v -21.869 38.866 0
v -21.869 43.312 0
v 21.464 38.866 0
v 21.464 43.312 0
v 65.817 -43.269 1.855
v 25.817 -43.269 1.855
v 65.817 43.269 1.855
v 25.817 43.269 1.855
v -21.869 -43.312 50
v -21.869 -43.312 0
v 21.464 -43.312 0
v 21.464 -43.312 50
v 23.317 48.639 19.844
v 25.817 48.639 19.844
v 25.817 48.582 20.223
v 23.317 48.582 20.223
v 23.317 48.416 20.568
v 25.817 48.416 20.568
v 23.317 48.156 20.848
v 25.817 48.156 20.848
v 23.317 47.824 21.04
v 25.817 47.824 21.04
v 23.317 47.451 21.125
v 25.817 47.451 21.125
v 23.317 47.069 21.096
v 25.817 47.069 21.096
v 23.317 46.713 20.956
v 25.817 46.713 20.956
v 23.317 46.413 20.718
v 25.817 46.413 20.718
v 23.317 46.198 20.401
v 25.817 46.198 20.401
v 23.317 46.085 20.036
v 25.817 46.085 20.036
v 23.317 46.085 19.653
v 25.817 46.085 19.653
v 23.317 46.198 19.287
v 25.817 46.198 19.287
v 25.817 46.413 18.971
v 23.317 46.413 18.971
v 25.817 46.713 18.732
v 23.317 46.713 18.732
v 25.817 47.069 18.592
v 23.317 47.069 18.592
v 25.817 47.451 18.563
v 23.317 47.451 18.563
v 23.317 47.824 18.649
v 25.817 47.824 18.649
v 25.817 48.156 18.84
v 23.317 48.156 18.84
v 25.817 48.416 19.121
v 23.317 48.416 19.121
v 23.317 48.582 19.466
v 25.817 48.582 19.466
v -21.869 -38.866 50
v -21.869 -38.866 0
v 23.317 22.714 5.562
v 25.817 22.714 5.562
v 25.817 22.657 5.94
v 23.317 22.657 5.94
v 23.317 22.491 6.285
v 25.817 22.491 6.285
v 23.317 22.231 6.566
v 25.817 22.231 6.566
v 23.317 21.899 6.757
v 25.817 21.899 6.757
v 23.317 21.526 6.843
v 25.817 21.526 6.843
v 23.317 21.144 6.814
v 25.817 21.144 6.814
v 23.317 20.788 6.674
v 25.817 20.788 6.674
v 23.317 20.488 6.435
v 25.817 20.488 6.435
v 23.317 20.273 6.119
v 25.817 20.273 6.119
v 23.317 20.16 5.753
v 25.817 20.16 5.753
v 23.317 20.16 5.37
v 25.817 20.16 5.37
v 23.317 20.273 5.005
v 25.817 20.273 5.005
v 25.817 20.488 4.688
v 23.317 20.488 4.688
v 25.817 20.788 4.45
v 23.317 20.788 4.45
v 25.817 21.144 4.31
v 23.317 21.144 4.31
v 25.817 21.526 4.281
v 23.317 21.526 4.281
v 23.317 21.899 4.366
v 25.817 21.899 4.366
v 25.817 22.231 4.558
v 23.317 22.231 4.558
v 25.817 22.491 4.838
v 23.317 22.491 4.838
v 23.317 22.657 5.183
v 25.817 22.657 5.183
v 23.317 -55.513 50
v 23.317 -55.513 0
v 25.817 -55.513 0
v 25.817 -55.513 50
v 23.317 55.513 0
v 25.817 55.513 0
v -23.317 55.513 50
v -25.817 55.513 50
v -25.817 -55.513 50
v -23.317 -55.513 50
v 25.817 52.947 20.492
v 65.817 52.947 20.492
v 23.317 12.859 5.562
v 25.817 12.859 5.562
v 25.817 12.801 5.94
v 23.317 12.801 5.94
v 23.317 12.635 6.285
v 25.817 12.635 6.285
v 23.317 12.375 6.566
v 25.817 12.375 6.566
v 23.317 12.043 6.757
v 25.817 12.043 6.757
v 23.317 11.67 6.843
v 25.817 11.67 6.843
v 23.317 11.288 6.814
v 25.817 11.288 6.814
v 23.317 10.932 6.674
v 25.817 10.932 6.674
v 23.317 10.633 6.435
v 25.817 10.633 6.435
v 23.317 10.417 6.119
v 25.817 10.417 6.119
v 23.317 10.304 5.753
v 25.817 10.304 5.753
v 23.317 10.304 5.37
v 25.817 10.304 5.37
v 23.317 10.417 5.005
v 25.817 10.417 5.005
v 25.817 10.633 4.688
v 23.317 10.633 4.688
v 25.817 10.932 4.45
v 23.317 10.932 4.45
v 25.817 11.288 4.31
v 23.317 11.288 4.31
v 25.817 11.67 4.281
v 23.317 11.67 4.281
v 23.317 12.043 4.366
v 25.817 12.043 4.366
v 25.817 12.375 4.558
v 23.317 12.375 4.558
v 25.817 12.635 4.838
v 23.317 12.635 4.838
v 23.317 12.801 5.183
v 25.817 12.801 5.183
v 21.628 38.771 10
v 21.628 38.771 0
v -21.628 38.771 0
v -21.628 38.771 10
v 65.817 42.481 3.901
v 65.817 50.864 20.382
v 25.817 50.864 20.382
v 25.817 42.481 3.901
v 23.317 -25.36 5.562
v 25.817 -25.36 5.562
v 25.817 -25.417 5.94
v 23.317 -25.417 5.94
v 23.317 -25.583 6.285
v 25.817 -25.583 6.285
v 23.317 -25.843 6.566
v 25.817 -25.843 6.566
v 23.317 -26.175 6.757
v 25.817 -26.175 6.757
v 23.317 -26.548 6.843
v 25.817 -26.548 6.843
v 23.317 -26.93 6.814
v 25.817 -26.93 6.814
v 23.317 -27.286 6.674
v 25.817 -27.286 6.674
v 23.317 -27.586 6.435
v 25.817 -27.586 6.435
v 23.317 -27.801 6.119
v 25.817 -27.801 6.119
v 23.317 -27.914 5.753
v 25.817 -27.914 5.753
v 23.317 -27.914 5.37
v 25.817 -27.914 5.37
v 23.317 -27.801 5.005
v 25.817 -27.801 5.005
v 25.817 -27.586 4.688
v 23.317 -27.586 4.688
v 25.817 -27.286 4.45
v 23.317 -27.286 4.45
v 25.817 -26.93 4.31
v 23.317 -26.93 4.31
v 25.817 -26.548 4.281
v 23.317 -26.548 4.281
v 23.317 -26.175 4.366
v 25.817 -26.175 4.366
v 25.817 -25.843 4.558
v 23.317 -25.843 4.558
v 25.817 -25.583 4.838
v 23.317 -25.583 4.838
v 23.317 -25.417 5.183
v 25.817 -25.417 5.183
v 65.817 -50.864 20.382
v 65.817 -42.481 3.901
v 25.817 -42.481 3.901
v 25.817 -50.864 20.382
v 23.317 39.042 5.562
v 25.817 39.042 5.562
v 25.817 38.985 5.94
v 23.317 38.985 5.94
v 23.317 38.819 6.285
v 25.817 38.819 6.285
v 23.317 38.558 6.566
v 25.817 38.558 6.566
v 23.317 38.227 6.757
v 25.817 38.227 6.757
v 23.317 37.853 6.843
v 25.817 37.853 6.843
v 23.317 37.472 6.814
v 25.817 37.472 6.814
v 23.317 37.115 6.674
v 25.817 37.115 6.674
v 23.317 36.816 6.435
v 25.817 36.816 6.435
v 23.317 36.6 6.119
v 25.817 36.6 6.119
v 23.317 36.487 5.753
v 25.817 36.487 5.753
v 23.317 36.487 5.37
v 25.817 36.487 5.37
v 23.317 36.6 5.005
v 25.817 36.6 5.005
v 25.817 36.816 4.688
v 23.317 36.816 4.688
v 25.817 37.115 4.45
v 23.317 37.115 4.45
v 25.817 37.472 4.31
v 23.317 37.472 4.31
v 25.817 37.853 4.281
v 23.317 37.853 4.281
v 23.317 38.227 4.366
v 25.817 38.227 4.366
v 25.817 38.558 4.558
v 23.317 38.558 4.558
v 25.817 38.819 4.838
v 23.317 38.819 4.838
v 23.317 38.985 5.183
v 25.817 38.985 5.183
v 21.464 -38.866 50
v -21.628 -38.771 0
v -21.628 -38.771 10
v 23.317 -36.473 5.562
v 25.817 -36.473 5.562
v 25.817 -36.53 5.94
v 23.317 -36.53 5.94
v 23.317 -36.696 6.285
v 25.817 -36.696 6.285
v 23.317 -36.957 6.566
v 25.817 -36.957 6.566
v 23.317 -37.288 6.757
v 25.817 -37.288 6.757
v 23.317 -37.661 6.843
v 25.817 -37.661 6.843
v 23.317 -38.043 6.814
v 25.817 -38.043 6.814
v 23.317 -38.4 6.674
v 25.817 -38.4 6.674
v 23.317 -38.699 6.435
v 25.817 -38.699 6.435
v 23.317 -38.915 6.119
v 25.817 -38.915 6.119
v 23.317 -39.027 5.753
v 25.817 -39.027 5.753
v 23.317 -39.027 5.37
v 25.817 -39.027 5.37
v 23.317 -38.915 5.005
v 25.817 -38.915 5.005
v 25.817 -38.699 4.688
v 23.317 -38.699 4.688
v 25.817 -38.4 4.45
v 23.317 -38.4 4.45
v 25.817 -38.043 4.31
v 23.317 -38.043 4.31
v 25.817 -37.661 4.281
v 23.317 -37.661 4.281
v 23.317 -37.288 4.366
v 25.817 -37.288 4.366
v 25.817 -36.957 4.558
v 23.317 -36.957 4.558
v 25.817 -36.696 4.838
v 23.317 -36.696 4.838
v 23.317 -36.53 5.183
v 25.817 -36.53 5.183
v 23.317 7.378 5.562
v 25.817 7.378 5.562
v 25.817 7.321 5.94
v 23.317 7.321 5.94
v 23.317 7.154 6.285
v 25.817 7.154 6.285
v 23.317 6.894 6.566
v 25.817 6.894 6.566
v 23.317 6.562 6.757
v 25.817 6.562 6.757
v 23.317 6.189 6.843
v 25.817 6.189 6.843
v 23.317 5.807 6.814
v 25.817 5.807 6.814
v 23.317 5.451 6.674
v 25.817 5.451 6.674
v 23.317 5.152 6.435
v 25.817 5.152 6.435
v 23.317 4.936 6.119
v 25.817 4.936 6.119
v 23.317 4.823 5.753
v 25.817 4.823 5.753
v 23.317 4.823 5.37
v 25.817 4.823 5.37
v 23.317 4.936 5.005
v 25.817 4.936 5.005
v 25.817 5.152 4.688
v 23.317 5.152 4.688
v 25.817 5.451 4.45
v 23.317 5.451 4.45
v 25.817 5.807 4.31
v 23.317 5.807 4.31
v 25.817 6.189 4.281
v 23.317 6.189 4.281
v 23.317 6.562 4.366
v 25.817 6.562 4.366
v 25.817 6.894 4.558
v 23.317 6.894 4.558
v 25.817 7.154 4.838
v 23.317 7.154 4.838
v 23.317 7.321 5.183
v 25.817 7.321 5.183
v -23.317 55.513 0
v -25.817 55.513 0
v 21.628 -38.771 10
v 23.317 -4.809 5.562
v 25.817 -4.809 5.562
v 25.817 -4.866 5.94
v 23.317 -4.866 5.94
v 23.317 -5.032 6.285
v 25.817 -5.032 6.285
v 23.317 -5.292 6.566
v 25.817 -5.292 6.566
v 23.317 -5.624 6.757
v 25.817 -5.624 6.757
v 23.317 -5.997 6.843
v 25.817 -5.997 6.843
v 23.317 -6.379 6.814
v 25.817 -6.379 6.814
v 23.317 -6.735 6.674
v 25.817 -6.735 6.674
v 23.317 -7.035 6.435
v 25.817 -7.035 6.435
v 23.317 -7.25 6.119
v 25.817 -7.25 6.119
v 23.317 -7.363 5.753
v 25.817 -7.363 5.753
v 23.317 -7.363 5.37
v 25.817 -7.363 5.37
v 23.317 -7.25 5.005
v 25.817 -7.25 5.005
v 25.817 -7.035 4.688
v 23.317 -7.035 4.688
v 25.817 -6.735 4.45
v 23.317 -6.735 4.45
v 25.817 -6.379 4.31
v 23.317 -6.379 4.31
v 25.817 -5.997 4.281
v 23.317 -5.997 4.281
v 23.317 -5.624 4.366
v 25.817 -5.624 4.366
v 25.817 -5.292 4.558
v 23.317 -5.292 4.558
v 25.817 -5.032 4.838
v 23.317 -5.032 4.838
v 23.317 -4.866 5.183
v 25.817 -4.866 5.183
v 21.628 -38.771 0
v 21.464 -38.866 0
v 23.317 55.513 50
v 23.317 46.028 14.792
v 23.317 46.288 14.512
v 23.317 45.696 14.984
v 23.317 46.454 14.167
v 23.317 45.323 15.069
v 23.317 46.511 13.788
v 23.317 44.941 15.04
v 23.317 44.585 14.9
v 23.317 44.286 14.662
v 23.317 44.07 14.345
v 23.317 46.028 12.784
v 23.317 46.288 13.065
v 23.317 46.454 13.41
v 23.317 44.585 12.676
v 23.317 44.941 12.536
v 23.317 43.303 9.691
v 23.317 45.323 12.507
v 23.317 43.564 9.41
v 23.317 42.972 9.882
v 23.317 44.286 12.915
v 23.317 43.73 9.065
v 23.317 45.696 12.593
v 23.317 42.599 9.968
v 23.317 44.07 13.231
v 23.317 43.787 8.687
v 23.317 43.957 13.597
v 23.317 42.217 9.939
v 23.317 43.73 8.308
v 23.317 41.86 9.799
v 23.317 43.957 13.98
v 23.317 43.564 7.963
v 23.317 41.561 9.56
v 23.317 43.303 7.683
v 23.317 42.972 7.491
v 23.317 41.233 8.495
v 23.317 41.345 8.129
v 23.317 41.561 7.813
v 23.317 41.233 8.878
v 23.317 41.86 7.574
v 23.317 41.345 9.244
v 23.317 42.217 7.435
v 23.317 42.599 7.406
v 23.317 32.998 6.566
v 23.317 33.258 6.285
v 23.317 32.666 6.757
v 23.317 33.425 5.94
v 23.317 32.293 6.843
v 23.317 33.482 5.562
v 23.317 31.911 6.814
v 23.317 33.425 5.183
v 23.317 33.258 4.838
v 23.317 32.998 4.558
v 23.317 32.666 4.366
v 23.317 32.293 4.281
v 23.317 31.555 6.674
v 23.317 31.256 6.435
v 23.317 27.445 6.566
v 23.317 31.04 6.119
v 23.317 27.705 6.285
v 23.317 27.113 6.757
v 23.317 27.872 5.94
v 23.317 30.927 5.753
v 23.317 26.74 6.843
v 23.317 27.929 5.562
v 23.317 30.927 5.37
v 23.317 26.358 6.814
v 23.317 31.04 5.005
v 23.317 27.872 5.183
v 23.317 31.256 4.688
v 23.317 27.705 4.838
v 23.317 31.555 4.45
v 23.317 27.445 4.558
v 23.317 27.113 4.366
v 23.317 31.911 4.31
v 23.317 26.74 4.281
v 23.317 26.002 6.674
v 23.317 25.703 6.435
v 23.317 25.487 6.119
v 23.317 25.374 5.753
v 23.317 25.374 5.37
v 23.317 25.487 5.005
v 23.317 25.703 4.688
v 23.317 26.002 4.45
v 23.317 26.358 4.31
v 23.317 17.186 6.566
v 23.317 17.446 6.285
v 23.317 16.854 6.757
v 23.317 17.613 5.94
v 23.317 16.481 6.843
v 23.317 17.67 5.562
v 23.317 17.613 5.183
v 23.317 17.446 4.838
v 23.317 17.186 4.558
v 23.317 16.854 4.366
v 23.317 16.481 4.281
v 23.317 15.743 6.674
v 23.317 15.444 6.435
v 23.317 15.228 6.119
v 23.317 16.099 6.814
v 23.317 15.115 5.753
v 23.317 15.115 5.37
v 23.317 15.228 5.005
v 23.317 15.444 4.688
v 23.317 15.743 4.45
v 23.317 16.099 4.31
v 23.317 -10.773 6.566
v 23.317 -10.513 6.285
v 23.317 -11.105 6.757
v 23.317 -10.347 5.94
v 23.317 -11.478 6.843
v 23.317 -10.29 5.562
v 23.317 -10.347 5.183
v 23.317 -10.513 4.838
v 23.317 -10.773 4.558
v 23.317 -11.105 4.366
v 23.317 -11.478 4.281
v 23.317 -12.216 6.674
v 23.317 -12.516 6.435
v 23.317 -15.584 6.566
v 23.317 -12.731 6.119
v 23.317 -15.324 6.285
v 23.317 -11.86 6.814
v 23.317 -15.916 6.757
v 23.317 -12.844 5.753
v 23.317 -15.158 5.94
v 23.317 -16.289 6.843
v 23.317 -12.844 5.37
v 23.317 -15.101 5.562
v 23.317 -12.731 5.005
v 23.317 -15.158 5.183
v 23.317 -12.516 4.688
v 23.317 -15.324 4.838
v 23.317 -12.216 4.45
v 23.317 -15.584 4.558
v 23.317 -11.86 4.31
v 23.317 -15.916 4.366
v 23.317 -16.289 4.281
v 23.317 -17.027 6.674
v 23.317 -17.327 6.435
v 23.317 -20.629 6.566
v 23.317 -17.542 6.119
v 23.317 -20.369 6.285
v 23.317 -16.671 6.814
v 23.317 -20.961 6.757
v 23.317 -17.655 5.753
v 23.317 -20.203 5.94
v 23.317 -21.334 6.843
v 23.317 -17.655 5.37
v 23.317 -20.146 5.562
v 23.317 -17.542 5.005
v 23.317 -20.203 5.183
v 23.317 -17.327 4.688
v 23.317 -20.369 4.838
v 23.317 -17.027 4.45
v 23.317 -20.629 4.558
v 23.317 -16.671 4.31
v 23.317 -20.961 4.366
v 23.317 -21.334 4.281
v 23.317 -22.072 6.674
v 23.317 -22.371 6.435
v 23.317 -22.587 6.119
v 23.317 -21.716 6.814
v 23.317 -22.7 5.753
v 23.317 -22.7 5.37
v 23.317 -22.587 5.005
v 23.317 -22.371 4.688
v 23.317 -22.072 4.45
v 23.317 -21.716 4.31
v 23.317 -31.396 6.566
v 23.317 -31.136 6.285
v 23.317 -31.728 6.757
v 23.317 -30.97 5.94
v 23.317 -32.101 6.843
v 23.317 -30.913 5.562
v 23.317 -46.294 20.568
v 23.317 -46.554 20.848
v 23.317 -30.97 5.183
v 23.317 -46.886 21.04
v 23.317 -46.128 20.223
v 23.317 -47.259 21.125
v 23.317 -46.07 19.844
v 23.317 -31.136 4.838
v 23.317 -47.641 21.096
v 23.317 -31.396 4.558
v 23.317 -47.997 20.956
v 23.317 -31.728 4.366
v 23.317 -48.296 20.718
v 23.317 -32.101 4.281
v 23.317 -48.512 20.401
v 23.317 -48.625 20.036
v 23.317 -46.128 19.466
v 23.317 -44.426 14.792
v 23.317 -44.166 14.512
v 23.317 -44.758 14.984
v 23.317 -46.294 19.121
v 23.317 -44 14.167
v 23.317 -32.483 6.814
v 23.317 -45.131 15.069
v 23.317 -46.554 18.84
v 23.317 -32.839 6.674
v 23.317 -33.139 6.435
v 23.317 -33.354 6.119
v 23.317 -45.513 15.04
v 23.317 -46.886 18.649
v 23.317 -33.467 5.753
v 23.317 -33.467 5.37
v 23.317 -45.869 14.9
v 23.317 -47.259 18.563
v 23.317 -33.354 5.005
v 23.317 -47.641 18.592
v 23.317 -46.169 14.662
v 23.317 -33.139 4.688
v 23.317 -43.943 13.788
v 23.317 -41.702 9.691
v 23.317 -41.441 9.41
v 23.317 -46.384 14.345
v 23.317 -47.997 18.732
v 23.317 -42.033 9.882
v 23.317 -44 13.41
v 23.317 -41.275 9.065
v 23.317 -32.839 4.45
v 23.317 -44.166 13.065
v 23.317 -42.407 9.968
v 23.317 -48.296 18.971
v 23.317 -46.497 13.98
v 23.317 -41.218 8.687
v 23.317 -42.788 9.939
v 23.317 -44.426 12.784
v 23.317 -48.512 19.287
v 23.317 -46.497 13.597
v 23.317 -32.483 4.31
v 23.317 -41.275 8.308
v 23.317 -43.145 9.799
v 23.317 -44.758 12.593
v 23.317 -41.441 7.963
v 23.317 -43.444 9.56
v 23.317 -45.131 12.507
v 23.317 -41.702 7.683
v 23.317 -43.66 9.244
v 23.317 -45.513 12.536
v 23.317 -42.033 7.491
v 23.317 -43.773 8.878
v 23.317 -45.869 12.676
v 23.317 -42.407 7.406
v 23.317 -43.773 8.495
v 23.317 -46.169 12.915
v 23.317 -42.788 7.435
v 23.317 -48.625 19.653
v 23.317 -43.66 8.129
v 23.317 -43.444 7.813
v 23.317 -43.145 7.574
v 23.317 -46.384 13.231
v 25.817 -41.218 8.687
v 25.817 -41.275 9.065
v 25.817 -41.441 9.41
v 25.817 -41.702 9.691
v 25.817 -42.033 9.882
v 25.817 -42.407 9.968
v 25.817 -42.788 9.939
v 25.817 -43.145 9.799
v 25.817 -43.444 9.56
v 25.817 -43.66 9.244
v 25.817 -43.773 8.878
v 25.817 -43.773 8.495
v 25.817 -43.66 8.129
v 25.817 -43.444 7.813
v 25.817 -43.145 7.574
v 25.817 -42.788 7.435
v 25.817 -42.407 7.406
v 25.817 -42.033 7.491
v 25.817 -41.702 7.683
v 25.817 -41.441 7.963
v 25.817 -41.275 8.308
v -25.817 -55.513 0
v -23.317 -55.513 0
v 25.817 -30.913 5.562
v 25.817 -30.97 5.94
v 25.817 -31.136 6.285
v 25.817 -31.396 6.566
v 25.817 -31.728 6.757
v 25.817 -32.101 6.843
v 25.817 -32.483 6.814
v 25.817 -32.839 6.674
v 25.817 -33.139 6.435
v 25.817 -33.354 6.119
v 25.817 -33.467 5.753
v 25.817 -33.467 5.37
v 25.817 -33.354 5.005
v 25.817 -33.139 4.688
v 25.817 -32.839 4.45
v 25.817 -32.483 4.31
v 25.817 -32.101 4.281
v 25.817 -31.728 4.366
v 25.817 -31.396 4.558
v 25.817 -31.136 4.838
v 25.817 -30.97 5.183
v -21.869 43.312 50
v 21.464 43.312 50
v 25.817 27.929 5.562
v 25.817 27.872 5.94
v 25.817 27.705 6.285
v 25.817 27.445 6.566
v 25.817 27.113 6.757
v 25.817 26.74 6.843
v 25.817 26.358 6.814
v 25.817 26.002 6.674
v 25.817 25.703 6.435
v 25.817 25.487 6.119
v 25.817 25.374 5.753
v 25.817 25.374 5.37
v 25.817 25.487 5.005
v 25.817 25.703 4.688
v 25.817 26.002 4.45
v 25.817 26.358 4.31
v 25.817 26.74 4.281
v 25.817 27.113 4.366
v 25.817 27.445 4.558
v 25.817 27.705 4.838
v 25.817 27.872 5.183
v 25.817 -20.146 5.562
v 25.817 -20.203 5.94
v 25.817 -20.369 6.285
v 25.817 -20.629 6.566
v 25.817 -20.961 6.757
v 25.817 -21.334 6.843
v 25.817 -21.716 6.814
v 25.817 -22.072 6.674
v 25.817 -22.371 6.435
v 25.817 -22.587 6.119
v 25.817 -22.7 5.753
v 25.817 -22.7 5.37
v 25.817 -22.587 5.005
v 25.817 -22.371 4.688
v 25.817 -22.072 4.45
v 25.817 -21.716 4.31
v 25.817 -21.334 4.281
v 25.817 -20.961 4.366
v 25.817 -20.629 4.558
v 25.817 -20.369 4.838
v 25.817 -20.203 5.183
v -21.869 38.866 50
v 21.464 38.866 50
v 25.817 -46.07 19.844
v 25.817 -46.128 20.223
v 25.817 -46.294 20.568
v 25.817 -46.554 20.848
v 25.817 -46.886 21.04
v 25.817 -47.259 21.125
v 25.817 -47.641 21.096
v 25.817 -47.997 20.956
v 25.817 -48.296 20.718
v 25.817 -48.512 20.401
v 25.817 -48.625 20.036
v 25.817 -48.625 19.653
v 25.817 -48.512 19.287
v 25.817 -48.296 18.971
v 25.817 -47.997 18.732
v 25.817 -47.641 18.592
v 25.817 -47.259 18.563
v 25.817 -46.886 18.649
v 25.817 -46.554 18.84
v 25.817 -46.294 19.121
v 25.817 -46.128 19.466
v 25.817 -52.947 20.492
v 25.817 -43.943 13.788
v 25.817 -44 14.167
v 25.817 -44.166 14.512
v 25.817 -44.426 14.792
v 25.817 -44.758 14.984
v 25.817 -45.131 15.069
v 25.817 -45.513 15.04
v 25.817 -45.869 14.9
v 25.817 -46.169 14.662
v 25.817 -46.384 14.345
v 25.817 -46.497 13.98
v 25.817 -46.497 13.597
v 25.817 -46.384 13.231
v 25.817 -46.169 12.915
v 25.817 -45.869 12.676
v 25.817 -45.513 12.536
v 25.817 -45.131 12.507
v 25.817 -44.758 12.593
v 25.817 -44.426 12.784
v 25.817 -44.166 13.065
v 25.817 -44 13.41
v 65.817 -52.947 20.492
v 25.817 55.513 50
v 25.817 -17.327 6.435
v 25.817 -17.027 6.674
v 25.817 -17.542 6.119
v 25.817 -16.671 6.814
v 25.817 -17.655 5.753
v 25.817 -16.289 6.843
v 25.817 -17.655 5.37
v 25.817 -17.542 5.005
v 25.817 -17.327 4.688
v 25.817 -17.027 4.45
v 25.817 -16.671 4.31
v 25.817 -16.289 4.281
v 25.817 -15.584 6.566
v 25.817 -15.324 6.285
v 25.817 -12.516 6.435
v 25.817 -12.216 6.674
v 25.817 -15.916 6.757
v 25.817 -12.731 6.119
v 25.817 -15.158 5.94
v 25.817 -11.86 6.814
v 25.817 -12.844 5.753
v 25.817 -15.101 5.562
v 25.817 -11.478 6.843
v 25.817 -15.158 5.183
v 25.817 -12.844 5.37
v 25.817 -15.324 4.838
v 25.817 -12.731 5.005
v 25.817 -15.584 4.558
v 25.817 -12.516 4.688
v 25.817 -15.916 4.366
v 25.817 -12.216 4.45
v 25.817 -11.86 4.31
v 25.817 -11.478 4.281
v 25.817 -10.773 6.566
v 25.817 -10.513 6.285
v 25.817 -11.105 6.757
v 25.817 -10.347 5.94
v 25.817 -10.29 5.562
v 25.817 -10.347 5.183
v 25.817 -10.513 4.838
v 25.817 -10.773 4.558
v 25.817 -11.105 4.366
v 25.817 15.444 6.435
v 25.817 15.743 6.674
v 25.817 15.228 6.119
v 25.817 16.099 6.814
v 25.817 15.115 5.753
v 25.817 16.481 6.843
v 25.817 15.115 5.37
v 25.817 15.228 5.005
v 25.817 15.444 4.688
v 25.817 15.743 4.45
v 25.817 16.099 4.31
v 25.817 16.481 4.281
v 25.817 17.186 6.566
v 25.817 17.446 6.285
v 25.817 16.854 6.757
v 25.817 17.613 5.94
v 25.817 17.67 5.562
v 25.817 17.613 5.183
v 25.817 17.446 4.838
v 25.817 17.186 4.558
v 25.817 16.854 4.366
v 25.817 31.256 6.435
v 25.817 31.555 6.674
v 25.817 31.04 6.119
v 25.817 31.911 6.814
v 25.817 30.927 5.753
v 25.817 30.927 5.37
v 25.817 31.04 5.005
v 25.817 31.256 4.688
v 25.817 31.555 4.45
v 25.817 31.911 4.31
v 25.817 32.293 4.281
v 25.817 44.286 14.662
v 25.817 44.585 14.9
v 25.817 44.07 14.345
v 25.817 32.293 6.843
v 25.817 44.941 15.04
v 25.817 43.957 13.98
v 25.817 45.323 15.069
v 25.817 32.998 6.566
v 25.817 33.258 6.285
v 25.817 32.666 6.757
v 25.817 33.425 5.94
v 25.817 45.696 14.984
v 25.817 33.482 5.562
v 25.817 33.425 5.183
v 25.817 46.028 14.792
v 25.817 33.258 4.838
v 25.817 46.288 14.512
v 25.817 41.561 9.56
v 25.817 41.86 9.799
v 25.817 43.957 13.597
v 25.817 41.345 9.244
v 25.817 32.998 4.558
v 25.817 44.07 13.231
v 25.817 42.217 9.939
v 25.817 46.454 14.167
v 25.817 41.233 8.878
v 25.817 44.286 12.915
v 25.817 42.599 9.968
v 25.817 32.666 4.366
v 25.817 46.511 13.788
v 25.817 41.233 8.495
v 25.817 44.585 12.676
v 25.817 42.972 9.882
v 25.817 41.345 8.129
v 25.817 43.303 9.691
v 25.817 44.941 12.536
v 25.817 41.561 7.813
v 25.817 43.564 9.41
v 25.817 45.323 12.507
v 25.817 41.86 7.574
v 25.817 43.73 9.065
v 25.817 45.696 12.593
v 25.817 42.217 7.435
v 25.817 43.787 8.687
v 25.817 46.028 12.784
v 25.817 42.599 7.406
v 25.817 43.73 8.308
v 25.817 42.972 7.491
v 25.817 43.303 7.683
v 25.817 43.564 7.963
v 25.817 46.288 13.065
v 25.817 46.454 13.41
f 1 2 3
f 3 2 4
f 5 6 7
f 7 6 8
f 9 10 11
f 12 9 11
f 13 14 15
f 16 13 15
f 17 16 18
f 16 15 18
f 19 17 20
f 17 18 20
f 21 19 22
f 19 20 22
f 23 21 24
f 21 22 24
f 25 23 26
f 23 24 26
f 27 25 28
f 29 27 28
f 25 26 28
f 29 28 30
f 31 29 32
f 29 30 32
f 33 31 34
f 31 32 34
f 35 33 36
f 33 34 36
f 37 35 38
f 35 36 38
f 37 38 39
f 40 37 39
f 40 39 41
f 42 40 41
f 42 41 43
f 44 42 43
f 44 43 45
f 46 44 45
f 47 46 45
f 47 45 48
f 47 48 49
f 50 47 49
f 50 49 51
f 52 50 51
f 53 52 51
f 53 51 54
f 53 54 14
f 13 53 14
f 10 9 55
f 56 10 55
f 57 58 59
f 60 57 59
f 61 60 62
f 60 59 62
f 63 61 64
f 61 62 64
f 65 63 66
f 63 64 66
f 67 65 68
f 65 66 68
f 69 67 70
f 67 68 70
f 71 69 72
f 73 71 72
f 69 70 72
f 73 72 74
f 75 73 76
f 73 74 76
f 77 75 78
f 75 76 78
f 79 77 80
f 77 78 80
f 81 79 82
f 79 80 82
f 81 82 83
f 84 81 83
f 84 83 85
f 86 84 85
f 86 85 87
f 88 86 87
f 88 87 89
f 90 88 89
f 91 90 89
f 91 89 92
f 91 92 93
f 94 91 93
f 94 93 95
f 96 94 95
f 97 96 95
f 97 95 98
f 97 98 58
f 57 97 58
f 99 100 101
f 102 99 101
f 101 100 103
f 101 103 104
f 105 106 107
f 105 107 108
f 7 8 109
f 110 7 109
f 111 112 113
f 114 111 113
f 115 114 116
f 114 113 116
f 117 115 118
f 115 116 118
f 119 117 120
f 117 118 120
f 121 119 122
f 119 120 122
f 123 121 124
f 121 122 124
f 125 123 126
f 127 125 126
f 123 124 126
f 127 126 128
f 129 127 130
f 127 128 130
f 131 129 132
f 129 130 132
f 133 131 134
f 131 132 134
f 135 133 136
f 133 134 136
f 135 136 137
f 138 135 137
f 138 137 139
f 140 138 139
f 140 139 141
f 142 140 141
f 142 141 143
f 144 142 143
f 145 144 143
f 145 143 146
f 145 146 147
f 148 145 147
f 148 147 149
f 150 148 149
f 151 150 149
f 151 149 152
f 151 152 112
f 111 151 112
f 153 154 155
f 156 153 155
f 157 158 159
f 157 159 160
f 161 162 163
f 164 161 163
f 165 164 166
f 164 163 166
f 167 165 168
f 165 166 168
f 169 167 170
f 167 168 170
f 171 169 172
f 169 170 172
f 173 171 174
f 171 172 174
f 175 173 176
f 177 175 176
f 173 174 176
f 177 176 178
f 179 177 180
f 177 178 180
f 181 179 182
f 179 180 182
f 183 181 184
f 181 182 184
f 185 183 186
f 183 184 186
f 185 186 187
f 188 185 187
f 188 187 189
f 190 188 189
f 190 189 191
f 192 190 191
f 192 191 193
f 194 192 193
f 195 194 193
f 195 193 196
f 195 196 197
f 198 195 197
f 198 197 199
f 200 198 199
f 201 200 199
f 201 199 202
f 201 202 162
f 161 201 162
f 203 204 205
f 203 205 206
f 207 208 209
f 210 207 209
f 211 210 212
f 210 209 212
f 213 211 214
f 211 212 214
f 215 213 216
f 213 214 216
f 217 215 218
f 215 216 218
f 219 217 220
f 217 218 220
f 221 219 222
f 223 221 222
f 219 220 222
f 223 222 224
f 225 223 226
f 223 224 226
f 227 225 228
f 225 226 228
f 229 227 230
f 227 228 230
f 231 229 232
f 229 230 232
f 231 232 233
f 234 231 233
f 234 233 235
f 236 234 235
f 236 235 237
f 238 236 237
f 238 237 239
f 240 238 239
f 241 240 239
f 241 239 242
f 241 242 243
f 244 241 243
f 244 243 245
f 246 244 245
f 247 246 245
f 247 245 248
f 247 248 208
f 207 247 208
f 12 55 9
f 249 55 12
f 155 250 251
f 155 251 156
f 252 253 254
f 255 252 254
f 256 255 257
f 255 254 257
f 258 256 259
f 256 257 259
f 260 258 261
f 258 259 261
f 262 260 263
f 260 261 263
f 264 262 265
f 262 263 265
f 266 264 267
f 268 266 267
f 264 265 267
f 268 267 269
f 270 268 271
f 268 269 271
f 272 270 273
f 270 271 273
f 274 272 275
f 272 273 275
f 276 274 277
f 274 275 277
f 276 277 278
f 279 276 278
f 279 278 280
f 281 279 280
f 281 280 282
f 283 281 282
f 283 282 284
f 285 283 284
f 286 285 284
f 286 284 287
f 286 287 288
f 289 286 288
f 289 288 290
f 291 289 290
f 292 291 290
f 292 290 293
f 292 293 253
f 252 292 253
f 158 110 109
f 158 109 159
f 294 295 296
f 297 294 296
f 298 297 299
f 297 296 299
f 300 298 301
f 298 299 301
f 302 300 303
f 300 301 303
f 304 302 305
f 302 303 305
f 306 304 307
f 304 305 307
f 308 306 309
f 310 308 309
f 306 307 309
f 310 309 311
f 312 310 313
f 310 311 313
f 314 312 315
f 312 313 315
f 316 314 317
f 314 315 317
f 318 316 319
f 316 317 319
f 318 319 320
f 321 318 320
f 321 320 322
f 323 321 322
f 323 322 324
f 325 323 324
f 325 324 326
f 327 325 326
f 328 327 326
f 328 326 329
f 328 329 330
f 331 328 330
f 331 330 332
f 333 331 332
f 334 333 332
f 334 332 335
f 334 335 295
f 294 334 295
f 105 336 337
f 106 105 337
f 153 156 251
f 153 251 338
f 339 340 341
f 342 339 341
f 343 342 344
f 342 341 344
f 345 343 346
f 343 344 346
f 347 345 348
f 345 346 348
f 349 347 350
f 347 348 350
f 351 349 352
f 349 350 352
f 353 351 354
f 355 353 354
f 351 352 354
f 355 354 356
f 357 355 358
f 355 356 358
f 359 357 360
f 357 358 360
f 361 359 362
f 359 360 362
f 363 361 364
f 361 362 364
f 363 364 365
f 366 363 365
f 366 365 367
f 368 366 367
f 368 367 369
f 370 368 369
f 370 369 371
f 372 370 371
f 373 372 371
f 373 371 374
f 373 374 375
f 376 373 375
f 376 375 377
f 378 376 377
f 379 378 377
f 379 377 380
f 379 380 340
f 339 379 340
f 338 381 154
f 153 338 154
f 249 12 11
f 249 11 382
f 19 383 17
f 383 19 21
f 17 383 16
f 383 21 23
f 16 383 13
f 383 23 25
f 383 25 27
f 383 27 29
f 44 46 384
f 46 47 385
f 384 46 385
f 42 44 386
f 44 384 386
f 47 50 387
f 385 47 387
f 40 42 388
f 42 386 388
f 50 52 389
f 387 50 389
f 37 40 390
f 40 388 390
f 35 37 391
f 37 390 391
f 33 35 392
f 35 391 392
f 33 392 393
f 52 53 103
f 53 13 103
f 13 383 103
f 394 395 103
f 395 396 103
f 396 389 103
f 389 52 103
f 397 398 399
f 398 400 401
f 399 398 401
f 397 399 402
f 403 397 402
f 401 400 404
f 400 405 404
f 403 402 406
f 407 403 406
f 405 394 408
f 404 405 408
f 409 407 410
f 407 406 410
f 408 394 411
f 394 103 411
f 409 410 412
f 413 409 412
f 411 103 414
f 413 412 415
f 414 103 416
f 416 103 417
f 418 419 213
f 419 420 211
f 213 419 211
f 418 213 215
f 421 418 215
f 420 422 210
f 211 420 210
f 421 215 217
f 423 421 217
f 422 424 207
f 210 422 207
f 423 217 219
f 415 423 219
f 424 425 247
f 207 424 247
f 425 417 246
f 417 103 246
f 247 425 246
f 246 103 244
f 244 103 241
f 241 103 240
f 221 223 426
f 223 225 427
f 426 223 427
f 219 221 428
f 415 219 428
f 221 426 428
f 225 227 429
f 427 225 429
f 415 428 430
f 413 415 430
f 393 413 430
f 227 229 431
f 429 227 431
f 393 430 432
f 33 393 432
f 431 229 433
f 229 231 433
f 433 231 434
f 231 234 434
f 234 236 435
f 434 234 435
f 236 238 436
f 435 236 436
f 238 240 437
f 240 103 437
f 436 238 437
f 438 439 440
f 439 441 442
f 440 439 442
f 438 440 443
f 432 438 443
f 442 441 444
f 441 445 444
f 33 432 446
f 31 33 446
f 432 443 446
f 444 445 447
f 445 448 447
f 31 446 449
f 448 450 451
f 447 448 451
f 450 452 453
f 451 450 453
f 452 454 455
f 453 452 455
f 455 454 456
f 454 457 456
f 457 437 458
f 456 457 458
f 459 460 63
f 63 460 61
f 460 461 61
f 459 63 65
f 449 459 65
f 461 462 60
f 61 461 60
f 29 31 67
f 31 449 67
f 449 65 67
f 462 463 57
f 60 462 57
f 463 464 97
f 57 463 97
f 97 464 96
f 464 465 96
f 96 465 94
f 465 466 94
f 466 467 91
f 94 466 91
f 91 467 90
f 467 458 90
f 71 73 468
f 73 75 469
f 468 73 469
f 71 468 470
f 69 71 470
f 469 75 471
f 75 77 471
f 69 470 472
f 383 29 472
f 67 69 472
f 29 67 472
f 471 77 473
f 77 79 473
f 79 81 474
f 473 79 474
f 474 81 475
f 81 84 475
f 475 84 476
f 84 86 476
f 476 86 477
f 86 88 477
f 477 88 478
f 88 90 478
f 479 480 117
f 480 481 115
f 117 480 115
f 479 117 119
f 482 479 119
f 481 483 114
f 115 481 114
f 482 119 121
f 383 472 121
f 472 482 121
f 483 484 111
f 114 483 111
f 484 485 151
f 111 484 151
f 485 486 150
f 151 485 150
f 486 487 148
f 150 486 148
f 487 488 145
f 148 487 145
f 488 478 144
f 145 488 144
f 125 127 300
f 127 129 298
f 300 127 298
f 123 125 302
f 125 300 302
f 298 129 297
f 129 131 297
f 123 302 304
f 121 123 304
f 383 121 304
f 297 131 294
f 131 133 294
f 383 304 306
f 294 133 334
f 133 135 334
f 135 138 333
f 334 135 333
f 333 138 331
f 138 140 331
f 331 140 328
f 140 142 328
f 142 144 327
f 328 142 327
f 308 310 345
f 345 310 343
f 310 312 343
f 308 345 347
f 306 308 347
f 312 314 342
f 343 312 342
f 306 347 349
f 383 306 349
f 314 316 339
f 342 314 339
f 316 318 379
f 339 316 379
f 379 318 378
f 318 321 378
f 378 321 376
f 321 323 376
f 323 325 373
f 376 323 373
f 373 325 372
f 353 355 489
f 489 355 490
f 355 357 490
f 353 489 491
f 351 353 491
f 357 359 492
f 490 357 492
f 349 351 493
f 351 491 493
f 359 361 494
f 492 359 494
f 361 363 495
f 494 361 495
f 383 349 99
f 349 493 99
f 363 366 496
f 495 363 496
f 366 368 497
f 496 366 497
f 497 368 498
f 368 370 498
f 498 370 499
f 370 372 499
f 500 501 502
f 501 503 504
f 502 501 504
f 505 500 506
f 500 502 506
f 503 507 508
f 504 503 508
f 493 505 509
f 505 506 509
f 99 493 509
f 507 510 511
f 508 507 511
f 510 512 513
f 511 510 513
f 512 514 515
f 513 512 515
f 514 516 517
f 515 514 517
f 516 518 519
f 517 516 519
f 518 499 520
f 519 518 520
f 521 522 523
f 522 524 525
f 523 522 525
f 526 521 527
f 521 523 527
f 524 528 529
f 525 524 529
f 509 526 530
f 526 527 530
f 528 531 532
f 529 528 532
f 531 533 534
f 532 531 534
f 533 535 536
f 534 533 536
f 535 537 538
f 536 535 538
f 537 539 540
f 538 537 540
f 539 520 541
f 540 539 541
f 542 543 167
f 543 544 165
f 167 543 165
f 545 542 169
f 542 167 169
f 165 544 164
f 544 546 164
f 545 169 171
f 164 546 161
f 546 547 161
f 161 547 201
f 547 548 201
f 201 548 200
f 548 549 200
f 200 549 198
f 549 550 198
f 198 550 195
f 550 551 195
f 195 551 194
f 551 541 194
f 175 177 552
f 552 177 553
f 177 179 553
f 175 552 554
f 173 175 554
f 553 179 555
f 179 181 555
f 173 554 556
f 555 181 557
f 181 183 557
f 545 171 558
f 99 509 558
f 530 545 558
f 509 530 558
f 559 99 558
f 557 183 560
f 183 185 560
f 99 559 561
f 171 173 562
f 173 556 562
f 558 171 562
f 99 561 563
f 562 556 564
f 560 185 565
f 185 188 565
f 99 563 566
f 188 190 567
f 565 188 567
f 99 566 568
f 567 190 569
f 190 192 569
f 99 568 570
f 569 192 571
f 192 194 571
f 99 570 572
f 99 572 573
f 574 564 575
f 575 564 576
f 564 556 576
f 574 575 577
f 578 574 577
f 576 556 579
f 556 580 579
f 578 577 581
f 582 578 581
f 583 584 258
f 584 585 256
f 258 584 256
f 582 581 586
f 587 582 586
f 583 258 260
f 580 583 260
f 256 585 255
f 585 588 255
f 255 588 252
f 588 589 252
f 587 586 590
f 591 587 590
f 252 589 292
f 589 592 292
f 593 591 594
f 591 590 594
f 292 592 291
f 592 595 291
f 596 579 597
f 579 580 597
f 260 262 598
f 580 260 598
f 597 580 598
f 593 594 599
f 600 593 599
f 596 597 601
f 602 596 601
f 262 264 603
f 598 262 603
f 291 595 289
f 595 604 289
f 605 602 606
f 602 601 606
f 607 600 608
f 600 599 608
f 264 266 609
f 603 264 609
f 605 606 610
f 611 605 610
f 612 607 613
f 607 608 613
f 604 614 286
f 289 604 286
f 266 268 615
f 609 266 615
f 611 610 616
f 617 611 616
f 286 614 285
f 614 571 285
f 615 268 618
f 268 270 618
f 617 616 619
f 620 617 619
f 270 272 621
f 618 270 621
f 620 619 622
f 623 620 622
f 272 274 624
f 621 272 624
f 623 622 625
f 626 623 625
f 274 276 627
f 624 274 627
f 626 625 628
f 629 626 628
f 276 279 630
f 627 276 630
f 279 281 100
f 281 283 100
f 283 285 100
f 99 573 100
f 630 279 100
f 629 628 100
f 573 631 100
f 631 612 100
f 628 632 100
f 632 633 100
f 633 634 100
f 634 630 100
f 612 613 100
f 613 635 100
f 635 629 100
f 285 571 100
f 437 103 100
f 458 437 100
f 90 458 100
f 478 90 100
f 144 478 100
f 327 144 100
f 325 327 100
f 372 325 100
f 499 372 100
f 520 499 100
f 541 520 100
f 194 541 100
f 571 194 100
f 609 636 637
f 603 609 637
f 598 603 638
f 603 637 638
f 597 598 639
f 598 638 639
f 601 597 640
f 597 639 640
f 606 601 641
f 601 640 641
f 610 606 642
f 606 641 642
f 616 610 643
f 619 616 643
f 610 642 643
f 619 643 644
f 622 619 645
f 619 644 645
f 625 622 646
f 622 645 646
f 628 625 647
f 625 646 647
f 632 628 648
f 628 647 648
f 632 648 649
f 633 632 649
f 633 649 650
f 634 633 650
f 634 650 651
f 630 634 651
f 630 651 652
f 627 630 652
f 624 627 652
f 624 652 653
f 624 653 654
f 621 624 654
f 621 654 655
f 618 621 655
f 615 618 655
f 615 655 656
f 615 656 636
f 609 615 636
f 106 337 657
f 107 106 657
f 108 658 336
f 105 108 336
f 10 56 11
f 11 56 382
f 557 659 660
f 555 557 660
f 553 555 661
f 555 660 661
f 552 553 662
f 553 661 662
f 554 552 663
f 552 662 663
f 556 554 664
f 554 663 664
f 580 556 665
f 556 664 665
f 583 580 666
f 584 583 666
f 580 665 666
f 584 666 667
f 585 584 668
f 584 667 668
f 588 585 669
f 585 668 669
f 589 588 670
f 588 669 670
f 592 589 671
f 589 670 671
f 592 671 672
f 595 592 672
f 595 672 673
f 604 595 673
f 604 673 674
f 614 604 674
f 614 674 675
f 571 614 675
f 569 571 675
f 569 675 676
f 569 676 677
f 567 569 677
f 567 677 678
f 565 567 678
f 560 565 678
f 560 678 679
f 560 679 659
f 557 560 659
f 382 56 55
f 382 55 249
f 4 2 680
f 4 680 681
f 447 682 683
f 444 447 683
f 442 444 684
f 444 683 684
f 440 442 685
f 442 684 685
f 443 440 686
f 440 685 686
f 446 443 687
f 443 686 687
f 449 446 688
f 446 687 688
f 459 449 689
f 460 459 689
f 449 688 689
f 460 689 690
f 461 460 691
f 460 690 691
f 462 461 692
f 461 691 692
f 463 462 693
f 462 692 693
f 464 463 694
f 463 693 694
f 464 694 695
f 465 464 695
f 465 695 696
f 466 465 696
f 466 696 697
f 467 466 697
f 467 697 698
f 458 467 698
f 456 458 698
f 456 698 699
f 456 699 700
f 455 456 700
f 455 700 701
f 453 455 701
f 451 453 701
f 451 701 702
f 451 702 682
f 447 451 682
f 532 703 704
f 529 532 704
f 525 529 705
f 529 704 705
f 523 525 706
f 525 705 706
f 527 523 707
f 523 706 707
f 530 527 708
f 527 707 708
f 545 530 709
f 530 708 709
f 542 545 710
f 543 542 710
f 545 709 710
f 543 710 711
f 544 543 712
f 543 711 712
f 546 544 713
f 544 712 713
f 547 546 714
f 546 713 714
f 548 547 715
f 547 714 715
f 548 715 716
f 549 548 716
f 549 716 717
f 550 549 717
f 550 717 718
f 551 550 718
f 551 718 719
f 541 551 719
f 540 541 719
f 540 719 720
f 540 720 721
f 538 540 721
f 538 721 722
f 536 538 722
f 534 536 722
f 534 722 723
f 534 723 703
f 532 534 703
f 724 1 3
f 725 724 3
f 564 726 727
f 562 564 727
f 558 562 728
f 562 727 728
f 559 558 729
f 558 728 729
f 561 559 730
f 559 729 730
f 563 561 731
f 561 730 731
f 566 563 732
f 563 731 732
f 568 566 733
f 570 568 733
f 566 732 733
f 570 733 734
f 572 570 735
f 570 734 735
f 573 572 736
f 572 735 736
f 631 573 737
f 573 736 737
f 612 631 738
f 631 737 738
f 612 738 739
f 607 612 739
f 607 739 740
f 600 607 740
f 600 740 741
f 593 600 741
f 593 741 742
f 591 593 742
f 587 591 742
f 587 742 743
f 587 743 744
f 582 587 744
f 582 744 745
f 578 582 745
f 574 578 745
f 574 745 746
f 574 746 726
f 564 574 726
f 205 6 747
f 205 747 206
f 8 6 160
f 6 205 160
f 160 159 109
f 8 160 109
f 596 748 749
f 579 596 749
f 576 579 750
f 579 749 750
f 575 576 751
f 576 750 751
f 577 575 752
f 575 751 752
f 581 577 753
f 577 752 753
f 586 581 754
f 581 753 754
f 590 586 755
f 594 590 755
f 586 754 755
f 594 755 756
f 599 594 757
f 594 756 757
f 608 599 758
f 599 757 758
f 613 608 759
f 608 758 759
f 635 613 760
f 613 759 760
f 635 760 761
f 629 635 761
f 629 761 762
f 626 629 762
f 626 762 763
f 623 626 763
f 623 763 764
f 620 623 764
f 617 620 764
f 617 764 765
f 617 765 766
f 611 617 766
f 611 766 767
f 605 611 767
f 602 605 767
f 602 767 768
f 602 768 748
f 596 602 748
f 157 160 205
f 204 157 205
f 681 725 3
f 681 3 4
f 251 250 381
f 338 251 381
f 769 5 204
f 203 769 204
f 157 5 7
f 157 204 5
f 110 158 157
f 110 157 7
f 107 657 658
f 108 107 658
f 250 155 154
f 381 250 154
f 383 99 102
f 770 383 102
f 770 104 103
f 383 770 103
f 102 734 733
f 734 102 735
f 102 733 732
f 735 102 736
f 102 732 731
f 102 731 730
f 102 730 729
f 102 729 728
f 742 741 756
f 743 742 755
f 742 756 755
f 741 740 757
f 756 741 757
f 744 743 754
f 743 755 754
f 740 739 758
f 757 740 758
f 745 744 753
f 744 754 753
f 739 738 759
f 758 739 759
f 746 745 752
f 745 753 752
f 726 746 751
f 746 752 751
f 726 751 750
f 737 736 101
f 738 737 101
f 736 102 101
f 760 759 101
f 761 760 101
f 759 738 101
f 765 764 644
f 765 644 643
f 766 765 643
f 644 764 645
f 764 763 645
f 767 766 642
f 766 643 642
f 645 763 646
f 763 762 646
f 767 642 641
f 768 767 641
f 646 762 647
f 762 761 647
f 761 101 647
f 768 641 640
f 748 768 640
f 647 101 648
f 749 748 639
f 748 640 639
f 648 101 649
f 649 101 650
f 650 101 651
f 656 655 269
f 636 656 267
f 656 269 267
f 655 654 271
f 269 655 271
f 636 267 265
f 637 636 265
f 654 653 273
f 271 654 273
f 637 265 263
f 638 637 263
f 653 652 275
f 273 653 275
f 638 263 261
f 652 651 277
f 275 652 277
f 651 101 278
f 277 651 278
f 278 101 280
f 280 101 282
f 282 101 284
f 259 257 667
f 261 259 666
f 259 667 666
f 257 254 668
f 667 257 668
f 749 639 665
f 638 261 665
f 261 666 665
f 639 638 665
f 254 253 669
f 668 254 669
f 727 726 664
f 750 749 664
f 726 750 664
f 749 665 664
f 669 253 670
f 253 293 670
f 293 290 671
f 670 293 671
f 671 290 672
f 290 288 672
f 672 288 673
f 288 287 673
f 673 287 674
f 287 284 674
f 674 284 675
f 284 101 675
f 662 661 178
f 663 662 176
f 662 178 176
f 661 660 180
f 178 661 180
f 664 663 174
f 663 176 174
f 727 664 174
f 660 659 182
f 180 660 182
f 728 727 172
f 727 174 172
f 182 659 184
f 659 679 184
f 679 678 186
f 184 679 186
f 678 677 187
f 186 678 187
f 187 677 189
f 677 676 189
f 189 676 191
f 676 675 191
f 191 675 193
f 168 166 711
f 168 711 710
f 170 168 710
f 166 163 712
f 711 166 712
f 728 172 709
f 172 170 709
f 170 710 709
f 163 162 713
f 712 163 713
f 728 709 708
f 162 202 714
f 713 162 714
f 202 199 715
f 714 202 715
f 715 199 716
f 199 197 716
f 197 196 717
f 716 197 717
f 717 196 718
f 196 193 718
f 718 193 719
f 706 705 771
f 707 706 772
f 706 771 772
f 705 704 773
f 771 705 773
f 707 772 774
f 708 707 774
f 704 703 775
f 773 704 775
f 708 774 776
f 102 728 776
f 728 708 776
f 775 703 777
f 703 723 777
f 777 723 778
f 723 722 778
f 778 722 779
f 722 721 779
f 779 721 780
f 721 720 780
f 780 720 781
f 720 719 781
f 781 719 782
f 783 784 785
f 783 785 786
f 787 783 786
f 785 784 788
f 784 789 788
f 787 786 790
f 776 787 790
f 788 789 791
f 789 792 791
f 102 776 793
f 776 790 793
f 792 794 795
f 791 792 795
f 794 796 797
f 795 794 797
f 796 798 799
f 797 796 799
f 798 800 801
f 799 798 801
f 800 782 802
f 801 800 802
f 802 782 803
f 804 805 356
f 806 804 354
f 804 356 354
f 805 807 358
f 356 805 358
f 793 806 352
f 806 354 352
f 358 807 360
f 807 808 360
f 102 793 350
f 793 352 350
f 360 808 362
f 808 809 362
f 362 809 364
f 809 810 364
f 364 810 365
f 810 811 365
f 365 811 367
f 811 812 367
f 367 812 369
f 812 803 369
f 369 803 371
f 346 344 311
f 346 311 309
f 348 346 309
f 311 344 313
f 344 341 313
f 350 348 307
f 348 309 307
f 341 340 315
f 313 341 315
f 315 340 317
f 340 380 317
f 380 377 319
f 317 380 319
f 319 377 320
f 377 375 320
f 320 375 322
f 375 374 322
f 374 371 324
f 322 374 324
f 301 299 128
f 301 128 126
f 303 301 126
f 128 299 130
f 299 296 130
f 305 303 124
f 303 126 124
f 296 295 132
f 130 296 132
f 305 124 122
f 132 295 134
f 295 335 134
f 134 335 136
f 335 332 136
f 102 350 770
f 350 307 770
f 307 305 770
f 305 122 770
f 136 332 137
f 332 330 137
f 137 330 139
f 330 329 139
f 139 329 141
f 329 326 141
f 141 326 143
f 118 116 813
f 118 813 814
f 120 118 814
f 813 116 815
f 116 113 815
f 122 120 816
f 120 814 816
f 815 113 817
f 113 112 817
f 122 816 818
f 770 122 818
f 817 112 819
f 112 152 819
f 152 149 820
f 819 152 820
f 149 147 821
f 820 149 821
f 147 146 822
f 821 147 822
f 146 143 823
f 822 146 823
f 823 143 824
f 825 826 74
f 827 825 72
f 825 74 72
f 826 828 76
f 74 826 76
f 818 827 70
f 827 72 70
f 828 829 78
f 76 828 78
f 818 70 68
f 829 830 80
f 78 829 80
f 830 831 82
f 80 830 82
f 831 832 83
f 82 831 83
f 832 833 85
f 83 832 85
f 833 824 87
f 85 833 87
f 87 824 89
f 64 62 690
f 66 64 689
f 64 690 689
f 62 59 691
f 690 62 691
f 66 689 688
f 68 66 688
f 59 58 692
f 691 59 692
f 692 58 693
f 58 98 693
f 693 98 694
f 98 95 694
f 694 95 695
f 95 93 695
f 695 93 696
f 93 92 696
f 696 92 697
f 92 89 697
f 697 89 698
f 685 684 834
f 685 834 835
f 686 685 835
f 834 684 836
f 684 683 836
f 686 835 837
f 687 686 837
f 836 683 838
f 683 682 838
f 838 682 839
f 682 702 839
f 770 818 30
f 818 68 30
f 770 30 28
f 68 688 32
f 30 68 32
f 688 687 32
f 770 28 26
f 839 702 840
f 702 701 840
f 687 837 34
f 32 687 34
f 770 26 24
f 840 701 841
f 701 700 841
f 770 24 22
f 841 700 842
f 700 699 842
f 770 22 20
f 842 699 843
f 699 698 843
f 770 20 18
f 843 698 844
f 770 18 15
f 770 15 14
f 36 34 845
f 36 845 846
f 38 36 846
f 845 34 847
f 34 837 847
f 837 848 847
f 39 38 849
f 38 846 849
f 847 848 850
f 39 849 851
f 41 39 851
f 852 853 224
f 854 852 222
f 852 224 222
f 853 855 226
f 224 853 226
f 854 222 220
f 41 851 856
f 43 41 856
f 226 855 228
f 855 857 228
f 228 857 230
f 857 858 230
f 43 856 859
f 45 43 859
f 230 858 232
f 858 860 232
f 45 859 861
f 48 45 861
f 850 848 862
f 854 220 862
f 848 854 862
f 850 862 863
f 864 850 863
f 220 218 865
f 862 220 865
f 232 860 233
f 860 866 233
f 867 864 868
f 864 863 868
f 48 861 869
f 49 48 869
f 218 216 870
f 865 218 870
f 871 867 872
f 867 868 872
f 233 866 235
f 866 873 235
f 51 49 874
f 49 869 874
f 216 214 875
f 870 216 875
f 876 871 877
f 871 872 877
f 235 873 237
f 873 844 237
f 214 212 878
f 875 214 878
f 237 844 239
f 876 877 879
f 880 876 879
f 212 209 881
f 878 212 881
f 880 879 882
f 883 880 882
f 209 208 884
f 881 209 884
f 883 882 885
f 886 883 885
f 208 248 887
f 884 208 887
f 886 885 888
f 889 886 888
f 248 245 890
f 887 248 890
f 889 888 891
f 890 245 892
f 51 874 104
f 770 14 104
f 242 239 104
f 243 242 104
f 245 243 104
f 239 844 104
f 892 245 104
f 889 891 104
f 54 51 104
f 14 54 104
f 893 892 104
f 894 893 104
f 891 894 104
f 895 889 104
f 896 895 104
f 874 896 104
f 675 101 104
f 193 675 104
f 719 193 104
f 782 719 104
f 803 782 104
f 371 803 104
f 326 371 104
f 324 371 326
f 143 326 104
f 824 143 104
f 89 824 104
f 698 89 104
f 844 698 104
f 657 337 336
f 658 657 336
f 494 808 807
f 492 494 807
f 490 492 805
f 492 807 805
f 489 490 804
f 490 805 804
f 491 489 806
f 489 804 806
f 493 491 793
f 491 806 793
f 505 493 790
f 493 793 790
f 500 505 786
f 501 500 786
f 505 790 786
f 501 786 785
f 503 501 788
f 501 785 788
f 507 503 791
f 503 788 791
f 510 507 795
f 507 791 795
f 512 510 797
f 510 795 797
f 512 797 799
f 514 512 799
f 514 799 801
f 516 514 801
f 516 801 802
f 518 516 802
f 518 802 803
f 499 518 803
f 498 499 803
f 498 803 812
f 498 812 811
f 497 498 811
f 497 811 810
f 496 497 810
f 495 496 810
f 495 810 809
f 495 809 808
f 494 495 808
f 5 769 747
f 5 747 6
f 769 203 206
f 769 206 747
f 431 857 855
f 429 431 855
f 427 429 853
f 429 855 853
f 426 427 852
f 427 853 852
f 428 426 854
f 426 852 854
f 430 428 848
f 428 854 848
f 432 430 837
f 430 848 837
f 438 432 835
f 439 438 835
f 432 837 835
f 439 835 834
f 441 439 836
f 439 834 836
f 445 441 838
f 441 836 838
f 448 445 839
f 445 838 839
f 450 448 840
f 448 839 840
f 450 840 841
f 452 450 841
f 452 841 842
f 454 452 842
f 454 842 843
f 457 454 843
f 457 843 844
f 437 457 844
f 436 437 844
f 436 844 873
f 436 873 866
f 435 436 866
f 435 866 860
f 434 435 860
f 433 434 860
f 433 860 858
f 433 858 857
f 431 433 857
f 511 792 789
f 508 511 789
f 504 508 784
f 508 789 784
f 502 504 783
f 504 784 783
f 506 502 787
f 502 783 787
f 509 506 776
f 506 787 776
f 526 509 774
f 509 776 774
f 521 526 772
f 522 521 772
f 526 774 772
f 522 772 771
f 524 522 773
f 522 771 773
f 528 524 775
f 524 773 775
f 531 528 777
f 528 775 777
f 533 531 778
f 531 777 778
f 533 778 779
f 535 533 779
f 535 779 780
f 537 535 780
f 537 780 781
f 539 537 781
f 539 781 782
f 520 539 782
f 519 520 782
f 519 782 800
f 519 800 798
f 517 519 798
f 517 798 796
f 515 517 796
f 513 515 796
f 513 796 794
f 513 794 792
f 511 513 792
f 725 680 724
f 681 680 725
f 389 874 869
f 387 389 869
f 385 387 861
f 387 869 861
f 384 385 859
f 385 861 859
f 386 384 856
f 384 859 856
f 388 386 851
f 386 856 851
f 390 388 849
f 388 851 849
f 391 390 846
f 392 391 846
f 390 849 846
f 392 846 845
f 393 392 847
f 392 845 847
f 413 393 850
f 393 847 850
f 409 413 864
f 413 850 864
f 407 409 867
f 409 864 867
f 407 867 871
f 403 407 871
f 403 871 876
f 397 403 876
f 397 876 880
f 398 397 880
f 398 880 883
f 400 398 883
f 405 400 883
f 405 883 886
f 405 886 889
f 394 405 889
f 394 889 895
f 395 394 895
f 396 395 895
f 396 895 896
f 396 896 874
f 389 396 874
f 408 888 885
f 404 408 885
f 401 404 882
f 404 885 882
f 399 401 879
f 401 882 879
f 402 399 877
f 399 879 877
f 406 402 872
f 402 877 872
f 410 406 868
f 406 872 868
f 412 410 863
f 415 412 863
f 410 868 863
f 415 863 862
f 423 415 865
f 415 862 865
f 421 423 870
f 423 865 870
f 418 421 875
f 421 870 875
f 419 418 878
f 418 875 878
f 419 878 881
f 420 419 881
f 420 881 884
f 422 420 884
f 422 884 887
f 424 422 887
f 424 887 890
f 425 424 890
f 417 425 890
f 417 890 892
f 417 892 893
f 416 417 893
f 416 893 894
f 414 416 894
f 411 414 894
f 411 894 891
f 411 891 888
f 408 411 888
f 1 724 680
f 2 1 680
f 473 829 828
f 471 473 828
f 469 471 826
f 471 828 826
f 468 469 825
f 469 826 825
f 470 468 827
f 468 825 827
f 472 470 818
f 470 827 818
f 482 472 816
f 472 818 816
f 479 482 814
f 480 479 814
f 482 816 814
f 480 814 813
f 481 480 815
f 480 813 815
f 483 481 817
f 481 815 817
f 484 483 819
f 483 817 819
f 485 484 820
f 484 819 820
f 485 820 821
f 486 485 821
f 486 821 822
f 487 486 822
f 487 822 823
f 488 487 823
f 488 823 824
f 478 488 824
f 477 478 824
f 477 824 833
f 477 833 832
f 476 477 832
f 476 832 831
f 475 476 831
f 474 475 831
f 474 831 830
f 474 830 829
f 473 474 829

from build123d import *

# Parameters (mm, degrees)
F0_W     = 21.6278625545
F0_H     = 77.5424886208
F1_DEPTH = 10
F0_W_2   = 43.3333408518
F0_H_2   = 4.4457448224
F2_DEPTH = 50
F3_R     = 1.2843906964
F4_DEPTH = 25
F6_DEPTH = 40


with BuildPart() as f1:
    # F0 (on Top) → F1 (new body)
    with BuildSketch(Plane.XY):
        with Locations((10.8139312773, 0)):
            Rectangle(F0_W, F0_H)
        with Locations((-10.8139312773, 0)):
            Rectangle(F0_W, F0_H)
    extrude(amount=F1_DEPTH)


with BuildPart() as f2:
    # F0 (on Top) → F2 (new body)
    with BuildSketch(Plane.XY):
        with Locations((-0.2027006072, 41.0887222738)):
            Rectangle(F0_W_2, F0_H_2)
    extrude(amount=F2_DEPTH)


with BuildPart() as f2b:
    # F0 (on Top) → F2, piece 2 (new body)
    with BuildSketch(Plane.XY):
        Polygon((-23.3169149258, -47.1327573904), (-23.3169149258, 38.7712443104), (-23.3169149258, 47.1327573904), (-23.3169149258, 55.5130317807), (-25.8169149258, 55.5130317807), (-25.8169149258, 47.1327573904), (-25.8169149258, 38.7712443104), (-25.8169149258, -47.1327573904), (-25.8169149258, -55.5130317807), (-23.3169149258, -55.5130317807), align=None)
    extrude(amount=F2_DEPTH)


with BuildPart() as f2c:
    # F0 (on Top) → F2, piece 3 (new body)
    with BuildSketch(Plane.XY):
        Polygon((23.3169149258, 47.1327573904), (23.3169149258, 38.7712443104), (23.3169149258, -47.1327573904), (23.3169149258, -55.5130317807), (25.8169149258, -55.5130317807), (25.8169149258, -47.1327573904), (25.8169149258, 38.7712443104), (25.8169149258, 47.1327573904), (25.8169149258, 55.5130317807), (23.3169149258, 55.5130317807), align=None)
    extrude(amount=F2_DEPTH)

    # F3 (on face) → F4 (cut)
    with BuildSketch(Plane.YZ.offset(25.8169149258)):
        with Locations((-47.3548397422, 19.8441818357)):
            Circle(F3_R)
        with Locations((-45.2270433307, 13.7881413102)):
            Circle(F3_R)
        with Locations((-42.502604425, 8.6867371574)):
            Circle(F3_R)
        with Locations((-37.7573892474, 5.5618393235)):
            Circle(F3_R)
        with Locations((-32.1971963072, 5.5618393235)):
            Circle(F3_R)
        with Locations((-26.6442311032, 5.5618393235)):
            Circle(F3_R)
        with Locations((-21.4299158396, 5.5618393235)):
            Circle(F3_R)
        with Locations((-16.38522475, 5.5618393235)):
            Circle(F3_R)
        with Locations((-11.5741421781, 5.5618393235)):
            Circle(F3_R)
        with Locations((-6.0931830667, 5.5618393235)):
            Circle(F3_R)
        with Locations((6.0931830667, 5.5618393235)):
            Circle(F3_R)
        with Locations((11.5741421781, 5.5618393235)):
            Circle(F3_R)
        with Locations((16.38522475, 5.5618393235)):
            Circle(F3_R)
        with Locations((21.4299158396, 5.5618393235)):
            Circle(F3_R)
        with Locations((26.6442311032, 5.5618393235)):
            Circle(F3_R)
        with Locations((32.1971963072, 5.5618393235)):
            Circle(F3_R)
        with Locations((37.7573892474, 5.5618393235)):
            Circle(F3_R)
        with Locations((42.502604425, 8.6867371574)):
            Circle(F3_R)
        with Locations((45.2270433307, 13.7881413102)):
            Circle(F3_R)
        with Locations((47.3548397422, 19.8441818357)):
            Circle(F3_R)
    extrude(amount=-F4_DEPTH, mode=Mode.SUBTRACT)


with BuildPart() as f2d:
    # F0 (on Top) → F2, piece 4 (new body)
    with BuildSketch(Plane.XY):
        with Locations((-0.2027006072, -41.0887222738)):
            Rectangle(F0_W_2, F0_H_2)
    extrude(amount=F2_DEPTH)


with BuildPart() as f6:
    # F5 (on face) → F6 (new body)
    with BuildSketch(Plane.YZ.offset(25.8169149258)):
        Polygon((-42.4813143909, 3.9014217909), (-50.863917917, 20.3824657947), (-52.9466159642, 20.4923860729), (-43.2693101466, 1.8546198262), (0, 1.8546198262), (0, 3.9014217909), align=None)
        Polygon((42.4813143909, 3.9014217909), (0, 3.9014217909), (0, 1.8546198262), (43.2693101466, 1.8546198262), (52.9466159642, 20.4923860729), (50.863917917, 20.3824657947), align=None)
    extrude(amount=F6_DEPTH)


solid = Compound([f1.part, f2.part, f2b.part, f2c.part, f2d.part, f6.part])
